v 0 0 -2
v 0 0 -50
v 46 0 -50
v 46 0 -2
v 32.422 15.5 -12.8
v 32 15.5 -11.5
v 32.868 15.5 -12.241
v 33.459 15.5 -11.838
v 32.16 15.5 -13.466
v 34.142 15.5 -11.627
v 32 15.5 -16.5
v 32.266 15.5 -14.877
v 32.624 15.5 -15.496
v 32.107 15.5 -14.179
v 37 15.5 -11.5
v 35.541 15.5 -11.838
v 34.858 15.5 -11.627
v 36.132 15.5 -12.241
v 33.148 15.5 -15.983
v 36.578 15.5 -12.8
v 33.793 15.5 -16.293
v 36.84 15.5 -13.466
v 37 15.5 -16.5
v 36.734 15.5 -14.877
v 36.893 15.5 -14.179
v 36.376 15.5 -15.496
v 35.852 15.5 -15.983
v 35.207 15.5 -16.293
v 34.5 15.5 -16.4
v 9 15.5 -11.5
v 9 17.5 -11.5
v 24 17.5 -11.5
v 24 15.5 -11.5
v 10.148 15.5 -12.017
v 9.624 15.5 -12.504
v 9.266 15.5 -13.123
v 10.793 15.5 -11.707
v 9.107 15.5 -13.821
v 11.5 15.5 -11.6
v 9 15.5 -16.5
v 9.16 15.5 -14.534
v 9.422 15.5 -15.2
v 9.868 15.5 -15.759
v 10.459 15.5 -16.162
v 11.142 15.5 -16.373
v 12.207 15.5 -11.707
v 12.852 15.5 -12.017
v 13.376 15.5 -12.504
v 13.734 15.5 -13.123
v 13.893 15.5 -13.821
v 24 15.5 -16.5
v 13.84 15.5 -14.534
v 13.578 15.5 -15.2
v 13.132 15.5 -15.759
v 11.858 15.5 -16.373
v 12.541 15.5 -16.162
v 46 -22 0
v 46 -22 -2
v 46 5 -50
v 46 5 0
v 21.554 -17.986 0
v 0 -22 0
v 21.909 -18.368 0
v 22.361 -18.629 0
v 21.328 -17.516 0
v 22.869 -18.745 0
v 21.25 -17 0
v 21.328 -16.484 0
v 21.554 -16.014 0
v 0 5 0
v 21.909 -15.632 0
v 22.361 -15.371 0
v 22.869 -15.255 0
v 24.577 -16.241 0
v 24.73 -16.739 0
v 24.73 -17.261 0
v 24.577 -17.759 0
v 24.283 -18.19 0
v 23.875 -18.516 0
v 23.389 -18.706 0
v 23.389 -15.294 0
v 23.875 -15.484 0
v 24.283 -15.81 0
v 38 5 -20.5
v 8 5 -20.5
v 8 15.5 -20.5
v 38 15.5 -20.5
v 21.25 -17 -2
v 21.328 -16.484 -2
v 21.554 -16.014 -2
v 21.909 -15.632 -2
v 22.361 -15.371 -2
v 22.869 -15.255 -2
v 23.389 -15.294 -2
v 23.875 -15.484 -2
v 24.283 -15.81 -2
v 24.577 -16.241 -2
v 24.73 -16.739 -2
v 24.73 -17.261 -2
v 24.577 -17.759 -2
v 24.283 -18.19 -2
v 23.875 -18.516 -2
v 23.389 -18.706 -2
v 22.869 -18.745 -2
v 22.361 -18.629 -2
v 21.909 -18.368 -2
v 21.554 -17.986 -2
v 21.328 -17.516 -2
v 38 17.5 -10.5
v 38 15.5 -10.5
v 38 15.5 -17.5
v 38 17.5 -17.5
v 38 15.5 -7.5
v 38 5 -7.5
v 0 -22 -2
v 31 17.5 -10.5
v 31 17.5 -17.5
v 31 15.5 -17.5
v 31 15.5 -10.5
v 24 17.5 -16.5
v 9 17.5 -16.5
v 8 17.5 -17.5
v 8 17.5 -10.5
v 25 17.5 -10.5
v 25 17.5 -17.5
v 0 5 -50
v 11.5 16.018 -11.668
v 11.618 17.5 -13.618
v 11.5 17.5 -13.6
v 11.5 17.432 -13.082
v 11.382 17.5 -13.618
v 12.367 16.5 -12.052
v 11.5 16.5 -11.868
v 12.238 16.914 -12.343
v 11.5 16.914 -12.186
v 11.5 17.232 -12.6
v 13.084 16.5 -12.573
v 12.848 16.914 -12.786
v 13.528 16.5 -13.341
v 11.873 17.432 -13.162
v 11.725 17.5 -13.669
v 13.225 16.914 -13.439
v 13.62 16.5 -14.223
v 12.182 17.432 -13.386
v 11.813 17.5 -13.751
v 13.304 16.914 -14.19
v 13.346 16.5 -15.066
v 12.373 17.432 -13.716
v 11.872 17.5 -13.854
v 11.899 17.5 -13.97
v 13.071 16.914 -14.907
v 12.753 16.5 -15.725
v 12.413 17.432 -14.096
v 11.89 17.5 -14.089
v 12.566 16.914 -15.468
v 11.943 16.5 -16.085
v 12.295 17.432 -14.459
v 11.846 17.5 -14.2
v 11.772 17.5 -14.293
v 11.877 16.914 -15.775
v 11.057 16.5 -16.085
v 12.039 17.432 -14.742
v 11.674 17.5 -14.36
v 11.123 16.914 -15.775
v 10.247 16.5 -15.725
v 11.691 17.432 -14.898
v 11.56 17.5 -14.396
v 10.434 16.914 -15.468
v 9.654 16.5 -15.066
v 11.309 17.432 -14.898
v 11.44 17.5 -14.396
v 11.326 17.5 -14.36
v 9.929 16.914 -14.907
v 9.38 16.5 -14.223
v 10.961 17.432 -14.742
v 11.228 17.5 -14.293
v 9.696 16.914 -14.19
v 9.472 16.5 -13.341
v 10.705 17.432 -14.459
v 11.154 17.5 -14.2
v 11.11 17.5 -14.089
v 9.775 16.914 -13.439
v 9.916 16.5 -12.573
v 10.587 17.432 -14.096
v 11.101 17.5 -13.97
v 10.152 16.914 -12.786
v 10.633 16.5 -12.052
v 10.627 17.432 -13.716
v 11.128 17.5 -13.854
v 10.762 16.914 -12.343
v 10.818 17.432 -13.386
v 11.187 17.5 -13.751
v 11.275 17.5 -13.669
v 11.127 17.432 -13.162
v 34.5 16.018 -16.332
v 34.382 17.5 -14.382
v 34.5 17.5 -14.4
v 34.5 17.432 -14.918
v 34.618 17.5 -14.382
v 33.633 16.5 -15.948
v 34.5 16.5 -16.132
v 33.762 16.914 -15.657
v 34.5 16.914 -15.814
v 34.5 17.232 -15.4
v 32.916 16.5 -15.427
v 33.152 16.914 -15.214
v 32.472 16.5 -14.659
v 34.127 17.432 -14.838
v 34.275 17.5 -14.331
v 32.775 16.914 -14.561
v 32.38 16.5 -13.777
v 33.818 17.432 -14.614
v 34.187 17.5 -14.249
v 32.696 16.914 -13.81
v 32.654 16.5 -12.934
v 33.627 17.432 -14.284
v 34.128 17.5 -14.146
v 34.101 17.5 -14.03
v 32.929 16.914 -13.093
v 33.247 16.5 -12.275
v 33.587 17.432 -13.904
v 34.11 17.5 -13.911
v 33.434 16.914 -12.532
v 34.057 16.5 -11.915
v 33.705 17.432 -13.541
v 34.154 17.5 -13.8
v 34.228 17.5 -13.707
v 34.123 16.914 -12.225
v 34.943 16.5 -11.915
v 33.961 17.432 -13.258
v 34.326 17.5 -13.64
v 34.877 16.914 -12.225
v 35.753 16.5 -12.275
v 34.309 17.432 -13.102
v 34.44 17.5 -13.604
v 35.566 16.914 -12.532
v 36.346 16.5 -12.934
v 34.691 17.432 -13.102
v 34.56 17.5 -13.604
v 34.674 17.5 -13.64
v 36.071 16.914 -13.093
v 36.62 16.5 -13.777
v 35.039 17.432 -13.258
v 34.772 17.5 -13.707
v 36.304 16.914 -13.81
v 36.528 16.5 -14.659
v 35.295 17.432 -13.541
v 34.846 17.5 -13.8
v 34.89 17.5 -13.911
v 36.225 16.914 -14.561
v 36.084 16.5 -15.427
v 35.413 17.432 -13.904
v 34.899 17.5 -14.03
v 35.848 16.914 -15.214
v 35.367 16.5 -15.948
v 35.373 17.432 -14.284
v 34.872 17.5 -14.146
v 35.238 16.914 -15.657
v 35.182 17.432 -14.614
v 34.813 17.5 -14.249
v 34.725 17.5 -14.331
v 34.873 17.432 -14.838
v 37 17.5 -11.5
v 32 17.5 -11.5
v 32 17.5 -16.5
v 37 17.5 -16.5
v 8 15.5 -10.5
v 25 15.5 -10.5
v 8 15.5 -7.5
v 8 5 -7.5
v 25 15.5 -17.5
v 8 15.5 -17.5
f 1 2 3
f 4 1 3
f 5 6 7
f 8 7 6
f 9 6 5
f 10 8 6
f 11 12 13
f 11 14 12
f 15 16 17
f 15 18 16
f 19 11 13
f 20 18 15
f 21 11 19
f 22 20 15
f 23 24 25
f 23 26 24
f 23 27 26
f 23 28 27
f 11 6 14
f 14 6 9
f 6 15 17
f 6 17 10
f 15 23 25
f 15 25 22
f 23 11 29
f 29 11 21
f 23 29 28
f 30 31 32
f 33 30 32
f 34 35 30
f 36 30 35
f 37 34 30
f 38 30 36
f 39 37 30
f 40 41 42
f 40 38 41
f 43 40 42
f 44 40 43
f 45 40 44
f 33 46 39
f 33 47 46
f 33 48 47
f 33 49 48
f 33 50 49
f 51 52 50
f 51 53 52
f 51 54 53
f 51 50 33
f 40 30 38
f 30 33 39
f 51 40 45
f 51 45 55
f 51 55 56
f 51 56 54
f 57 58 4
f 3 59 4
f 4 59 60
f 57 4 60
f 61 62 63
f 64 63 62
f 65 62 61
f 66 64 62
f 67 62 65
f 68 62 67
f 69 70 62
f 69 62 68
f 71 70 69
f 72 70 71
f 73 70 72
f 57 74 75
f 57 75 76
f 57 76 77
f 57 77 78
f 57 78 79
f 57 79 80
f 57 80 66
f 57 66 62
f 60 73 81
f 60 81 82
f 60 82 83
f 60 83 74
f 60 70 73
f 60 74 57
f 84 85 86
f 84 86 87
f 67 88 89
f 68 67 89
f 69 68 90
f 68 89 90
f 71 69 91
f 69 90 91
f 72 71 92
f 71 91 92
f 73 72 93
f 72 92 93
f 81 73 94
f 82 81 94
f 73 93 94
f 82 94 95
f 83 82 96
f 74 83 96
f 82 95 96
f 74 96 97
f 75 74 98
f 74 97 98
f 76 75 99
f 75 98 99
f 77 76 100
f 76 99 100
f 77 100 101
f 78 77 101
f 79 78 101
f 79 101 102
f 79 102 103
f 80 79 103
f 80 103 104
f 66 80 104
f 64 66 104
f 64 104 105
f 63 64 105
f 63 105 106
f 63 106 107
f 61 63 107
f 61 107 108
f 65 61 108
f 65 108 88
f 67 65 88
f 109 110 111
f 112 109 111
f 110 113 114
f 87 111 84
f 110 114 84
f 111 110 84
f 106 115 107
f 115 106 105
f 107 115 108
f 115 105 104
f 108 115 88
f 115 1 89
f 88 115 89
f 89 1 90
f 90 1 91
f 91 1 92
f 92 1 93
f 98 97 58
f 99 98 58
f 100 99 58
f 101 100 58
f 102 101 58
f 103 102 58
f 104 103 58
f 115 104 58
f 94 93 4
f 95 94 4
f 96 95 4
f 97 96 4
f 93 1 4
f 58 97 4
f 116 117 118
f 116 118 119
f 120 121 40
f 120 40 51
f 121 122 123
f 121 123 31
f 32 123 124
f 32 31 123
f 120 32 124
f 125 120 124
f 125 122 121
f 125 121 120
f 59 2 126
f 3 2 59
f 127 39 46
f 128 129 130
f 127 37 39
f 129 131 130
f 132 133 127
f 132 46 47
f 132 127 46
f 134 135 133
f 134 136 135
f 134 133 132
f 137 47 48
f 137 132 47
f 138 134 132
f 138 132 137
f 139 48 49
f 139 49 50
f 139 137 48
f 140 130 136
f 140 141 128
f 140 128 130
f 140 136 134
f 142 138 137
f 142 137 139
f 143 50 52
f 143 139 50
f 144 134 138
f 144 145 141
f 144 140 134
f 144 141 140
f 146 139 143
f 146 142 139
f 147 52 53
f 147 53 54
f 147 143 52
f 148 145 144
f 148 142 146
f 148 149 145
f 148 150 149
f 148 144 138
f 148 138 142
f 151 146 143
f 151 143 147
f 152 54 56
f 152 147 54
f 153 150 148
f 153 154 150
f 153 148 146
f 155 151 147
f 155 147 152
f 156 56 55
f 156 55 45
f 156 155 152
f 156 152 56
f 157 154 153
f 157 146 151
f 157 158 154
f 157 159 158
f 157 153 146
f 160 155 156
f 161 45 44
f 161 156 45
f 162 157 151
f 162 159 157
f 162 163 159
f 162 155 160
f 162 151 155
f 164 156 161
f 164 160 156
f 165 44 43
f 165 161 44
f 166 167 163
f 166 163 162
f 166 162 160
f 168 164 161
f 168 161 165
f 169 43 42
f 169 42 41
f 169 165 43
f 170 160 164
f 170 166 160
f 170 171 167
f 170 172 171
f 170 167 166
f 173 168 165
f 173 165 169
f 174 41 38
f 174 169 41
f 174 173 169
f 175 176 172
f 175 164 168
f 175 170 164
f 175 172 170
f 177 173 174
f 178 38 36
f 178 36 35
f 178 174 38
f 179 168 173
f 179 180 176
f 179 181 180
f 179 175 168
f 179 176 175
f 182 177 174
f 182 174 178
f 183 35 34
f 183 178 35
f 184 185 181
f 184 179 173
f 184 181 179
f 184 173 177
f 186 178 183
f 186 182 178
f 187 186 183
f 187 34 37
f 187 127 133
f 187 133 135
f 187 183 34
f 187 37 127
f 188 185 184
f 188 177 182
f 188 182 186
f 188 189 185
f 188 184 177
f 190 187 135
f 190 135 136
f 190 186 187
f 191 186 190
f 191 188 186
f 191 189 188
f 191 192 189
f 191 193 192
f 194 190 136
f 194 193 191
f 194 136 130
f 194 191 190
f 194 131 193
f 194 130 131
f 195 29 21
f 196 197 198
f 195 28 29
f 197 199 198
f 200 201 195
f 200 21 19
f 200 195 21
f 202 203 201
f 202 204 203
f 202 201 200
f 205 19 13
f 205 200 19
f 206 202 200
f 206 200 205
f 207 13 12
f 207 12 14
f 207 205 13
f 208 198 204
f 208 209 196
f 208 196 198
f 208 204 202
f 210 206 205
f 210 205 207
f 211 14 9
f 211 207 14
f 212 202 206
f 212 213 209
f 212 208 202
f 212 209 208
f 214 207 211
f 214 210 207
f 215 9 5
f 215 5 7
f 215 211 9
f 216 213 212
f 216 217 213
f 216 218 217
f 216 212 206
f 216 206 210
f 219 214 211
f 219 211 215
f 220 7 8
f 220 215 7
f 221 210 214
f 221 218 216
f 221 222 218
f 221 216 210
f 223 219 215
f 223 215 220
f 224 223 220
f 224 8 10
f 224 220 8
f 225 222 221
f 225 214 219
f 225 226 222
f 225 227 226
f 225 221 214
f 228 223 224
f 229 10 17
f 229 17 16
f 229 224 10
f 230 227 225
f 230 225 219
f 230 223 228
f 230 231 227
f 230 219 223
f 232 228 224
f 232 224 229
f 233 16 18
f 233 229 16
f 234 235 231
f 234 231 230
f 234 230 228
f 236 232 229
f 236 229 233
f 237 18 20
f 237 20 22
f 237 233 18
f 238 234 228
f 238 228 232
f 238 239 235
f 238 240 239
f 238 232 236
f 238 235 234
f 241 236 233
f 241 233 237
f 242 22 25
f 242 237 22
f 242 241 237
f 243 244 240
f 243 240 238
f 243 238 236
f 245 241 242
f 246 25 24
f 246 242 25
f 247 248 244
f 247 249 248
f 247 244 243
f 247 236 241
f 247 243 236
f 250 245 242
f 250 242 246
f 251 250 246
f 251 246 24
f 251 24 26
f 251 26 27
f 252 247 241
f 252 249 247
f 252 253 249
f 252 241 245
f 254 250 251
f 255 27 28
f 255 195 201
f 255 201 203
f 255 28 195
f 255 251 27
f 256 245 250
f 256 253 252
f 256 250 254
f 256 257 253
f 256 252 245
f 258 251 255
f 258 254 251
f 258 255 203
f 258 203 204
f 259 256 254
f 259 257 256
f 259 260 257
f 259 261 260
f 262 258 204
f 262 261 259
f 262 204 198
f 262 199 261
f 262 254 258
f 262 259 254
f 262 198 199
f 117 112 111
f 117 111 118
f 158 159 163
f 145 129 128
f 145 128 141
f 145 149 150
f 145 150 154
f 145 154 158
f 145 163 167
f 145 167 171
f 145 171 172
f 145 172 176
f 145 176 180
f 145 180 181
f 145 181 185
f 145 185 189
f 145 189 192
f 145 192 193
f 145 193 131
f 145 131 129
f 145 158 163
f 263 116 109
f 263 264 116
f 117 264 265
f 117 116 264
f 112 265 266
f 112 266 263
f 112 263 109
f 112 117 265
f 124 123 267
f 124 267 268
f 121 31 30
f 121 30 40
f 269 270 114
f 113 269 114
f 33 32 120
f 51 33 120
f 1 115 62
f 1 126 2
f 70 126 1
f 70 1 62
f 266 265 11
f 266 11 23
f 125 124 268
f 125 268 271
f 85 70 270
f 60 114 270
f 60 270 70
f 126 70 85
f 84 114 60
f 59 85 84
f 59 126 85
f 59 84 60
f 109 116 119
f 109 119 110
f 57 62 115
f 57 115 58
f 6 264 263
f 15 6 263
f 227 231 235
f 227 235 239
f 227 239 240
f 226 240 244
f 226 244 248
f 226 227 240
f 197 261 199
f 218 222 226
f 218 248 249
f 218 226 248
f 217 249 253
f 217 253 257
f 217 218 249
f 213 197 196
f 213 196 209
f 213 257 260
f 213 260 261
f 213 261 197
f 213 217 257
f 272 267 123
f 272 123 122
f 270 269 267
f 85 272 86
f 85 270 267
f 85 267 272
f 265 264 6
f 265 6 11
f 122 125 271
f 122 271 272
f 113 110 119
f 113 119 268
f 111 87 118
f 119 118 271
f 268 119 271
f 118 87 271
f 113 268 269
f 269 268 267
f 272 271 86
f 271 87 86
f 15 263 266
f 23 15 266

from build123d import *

# Parameters (mm, degrees)
SKETCH1_W           = 46
SKETCH1_H           = 50
BOSS_EXTRUDE1_DEPTH = 5
SKETCH2_W           = 30
SKETCH2_H           = 13
BOSS_EXTRUDE2_DEPTH = 12.5
SKETCH3_W           = 46
SKETCH3_H           = 2
BOSS_EXTRUDE3_DEPTH = 22
SKETCH4_R           = 1.75
CUT_EXTRUDE1_DEPTH  = 22
SKETCH5_W           = 15
SKETCH5_H           = 5
SKETCH5_W_2         = 5
CUT_EXTRUDE2_DEPTH  = 2
SKETCH6_R           = 2.4
BOSS_EXTRUDE6_DEPTH = 2
FILLET1_R           = 2


with BuildPart() as part:
    # Sketch1 → Boss-Extrude1 (new body)
    with BuildSketch(Plane(origin=(0, 0, 0), x_dir=(1, 0, 0), z_dir=(0, 1, 0))):
        with Locations((23, 25)):
            Rectangle(SKETCH1_W, SKETCH1_H)
    extrude(amount=BOSS_EXTRUDE1_DEPTH)

    # Sketch2 → Boss-Extrude2 (add)
    with BuildSketch(Plane(origin=(0, 5, 0), x_dir=(1, 0, 0), z_dir=(0, 1, 0))):
        with Locations((23, 14)):
            Rectangle(SKETCH2_W, SKETCH2_H)
    extrude(amount=BOSS_EXTRUDE2_DEPTH)

    # Sketch3 → Boss-Extrude3 (add)
    with BuildSketch(Plane.XZ):
        with Locations((23, -1)):
            Rectangle(SKETCH3_W, SKETCH3_H)
    extrude(amount=BOSS_EXTRUDE3_DEPTH)

    # Sketch4 → Cut-Extrude1 (cut)
    with BuildSketch(Plane(origin=(0, 0, -2), x_dir=(-1, 0, 0), z_dir=(0, 0, -1))):
        with Locations((-23, -17)):
            Circle(SKETCH4_R)
    extrude(amount=-CUT_EXTRUDE1_DEPTH, mode=Mode.SUBTRACT)

    # Sketch5 → Cut-Extrude2 (cut)
    with BuildSketch(Plane(origin=(0, 17.5, 0), x_dir=(1, 0, 0), z_dir=(0, 1, 0))):
        with Locations((16.5, 14)):
            Rectangle(SKETCH5_W, SKETCH5_H)
        with Locations((34.5, 14)):
            Rectangle(SKETCH5_W_2, SKETCH5_H)
        Polygon((31, 17.5), (31, 10.5), (38, 10.5), (38, 7.5), (8, 7.5), (8, 10.5), (25, 10.5), (25, 17.5), (8, 17.5), (8, 20.5), (38, 20.5), (38, 17.5), align=None)
    extrude(amount=-CUT_EXTRUDE2_DEPTH, mode=Mode.SUBTRACT)

    # Sketch6 → Boss-Extrude6 (add)
    with BuildSketch(Plane(origin=(0, 15.5, 0), x_dir=(1, 0, 0), z_dir=(0, 1, 0))):
        with Locations(Location((11.5, 14, 0), (0, 0, 270))):
            Circle(SKETCH6_R)
        with Locations(Location((34.5, 14, 0), (0, 0, 90))):
            Circle(SKETCH6_R)
    extrude(amount=BOSS_EXTRUDE6_DEPTH)

    # Fillet1
    fillet1_edges = [part.edges().sort_by_distance(p)[0] for p in [
        (11.5, 17.5, -16.4),
        (34.5, 17.5, -11.6),
    ]]
    fillet(fillet1_edges, radius=FILLET1_R - 0.0001)  # a hair under: the kernel refuses the full size


solid = part.part
